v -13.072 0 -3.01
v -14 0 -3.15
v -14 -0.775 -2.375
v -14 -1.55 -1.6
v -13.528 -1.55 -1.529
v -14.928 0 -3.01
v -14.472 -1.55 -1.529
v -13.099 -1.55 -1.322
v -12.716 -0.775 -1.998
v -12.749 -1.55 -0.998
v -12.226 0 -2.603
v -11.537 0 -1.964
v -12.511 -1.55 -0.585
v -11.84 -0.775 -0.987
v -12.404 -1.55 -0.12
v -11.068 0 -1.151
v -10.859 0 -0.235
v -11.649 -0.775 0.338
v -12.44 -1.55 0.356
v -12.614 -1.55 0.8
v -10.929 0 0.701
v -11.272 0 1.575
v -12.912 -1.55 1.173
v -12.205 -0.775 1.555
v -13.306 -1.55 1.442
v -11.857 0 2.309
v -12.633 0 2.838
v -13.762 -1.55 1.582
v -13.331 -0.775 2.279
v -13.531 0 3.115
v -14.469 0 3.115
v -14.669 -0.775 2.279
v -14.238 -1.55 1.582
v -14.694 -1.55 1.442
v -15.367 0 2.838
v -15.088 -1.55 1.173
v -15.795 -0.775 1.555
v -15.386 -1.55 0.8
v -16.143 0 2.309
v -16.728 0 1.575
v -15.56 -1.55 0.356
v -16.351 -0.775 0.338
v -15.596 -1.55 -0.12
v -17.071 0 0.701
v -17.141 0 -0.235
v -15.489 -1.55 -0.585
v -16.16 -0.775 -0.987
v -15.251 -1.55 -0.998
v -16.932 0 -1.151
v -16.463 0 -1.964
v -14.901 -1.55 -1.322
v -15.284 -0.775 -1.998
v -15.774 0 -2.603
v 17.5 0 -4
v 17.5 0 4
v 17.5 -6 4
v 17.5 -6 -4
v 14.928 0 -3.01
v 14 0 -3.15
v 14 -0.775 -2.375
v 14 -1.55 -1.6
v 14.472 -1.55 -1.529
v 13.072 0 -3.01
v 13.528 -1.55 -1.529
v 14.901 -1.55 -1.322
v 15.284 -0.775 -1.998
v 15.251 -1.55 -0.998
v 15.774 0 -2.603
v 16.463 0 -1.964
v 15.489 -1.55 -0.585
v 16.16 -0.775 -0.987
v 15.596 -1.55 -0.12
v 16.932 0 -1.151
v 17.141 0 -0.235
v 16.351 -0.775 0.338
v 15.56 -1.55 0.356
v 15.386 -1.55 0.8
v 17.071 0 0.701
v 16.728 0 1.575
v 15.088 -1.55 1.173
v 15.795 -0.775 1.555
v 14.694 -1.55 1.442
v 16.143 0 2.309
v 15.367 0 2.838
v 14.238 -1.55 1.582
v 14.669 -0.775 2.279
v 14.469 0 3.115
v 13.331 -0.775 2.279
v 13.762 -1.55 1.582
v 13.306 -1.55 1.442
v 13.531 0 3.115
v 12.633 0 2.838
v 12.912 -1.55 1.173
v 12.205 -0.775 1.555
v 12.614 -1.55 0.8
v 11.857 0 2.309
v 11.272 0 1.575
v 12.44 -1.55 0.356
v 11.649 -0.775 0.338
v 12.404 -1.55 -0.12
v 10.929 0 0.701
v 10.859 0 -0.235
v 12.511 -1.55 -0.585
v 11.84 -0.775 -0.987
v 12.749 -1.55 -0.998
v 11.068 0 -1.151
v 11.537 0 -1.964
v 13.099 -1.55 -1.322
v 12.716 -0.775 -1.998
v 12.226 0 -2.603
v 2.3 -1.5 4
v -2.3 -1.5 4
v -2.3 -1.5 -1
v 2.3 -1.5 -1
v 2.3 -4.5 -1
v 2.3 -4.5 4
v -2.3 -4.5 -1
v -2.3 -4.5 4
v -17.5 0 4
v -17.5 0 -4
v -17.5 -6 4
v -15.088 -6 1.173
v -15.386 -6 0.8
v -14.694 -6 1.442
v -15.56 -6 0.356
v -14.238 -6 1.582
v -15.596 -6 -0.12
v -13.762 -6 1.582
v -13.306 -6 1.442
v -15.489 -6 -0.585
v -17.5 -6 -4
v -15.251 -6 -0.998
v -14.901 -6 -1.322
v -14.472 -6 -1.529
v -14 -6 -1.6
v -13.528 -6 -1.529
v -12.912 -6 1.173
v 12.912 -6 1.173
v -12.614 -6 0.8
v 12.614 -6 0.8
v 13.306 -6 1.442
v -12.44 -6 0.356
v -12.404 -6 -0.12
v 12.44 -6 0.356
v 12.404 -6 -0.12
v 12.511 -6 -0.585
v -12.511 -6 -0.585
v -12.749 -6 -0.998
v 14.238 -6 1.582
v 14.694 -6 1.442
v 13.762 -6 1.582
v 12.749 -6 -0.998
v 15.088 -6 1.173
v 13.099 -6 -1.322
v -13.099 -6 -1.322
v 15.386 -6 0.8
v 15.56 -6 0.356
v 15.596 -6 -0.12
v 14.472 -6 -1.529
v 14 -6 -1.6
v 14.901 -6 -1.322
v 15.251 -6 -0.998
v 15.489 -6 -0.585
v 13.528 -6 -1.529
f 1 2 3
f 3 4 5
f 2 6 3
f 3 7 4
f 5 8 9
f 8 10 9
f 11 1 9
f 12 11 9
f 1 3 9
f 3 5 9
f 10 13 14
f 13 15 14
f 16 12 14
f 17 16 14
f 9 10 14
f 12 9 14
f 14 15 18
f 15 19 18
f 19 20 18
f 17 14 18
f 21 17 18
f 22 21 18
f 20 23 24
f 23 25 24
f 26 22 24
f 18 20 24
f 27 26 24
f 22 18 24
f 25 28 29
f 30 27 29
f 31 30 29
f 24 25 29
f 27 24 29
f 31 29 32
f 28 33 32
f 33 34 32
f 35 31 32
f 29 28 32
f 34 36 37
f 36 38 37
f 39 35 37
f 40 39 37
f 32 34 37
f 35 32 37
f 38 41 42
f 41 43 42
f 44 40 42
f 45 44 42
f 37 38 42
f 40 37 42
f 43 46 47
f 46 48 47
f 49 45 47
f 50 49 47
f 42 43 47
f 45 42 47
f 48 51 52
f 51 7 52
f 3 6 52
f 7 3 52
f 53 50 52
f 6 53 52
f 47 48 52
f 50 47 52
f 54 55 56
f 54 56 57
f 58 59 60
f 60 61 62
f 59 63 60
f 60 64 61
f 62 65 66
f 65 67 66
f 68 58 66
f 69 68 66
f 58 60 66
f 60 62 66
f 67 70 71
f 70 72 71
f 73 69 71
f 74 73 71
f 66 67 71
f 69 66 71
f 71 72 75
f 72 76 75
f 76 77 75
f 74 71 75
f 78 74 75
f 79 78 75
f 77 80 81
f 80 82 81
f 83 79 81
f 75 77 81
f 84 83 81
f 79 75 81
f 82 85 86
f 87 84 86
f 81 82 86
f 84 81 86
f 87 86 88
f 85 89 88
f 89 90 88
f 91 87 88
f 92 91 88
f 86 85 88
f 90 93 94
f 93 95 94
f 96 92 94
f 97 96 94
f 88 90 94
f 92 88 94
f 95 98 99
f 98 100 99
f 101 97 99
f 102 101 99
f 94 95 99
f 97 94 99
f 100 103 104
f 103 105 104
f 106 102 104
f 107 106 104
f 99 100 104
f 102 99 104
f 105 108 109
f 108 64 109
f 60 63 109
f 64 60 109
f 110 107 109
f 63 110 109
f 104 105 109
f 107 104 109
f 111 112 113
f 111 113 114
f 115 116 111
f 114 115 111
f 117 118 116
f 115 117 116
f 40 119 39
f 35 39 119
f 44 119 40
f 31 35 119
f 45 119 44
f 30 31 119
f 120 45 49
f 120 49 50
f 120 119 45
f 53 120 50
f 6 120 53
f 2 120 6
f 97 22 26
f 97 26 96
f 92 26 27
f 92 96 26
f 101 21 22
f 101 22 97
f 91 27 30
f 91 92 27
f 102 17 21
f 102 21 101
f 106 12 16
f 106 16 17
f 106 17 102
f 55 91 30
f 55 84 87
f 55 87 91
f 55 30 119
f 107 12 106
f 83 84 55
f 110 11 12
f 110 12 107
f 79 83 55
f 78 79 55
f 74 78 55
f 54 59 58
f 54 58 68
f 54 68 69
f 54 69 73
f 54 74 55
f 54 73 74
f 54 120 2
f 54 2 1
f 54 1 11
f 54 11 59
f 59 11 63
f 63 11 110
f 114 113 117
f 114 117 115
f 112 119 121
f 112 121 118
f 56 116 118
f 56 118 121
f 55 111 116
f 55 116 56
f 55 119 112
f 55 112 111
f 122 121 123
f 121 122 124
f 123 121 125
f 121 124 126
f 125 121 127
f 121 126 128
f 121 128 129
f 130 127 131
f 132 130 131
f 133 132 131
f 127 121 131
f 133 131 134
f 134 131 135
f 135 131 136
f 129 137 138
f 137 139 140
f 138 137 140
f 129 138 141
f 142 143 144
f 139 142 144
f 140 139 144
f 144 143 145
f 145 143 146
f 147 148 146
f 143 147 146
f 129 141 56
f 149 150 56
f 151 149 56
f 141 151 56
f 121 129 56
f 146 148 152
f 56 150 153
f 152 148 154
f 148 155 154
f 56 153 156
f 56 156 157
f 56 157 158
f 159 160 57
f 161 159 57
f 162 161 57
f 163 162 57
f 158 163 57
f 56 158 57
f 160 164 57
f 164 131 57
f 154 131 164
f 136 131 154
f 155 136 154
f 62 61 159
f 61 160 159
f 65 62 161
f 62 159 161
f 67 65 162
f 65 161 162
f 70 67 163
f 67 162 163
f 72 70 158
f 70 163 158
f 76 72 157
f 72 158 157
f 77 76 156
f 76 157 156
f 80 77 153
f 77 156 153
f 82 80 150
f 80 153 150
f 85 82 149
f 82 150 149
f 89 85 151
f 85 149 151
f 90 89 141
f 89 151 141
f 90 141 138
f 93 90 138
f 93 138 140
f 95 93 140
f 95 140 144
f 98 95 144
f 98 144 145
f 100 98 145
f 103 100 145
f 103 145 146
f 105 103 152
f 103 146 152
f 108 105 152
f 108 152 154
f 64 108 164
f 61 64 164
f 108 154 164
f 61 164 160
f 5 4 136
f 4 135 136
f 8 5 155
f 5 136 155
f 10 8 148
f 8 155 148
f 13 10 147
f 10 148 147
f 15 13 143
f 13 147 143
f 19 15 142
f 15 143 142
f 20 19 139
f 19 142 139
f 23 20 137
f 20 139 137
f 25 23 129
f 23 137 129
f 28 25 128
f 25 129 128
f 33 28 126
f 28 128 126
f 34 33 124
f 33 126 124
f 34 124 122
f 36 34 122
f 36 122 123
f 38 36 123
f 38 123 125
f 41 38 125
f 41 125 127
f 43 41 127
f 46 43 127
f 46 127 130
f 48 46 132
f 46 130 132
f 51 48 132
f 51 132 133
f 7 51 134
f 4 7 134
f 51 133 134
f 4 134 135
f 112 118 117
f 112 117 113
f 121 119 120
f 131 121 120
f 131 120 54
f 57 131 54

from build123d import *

# Parameters (mm, degrees)
SKETCH1_W                                       = 35
SKETCH1_H                                       = 8
BOSS_EXTRUDE1_DEPTH                             = 6
SKETCH2_W                                       = 4.6
SKETCH2_H                                       = 3
CUT_EXTRUDE1_DEPTH                              = 5
CSK_FOR_M3_FLAT_HEAD_MACHINE_SCREW1_D           = 3.2
CSK_FOR_M3_FLAT_HEAD_MACHINE_SCREW1_CSINK_D     = 6.3
CSK_FOR_M3_FLAT_HEAD_MACHINE_SCREW1_CSINK_ANGLE = 90


with BuildPart() as part:
    # Sketch1 → Boss-Extrude1 (new body)
    with BuildSketch(Plane(origin=(0, 0, 0), x_dir=(1, 0, 0), z_dir=(0, 1, 0))):
        Rectangle(SKETCH1_W, SKETCH1_H)
    extrude(amount=-BOSS_EXTRUDE1_DEPTH)

    # Sketch2 → Cut-Extrude1 (cut)
    with BuildSketch(Plane.XY.offset(4)):
        with Locations((0, -3)):
            Rectangle(SKETCH2_W, SKETCH2_H)
    extrude(amount=-CUT_EXTRUDE1_DEPTH, mode=Mode.SUBTRACT)

    # CSK for M3 Flat Head Machine Screw1 (through all)
    with Locations(Plane(origin=(-14, 0, 0), x_dir=(0, 0, 1), z_dir=(0, 1, 0))):
        with Locations((0, 0), (0, 28)):
            CounterSinkHole(CSK_FOR_M3_FLAT_HEAD_MACHINE_SCREW1_D / 2, CSK_FOR_M3_FLAT_HEAD_MACHINE_SCREW1_CSINK_D / 2, counter_sink_angle=CSK_FOR_M3_FLAT_HEAD_MACHINE_SCREW1_CSINK_ANGLE)


solid = part.part
